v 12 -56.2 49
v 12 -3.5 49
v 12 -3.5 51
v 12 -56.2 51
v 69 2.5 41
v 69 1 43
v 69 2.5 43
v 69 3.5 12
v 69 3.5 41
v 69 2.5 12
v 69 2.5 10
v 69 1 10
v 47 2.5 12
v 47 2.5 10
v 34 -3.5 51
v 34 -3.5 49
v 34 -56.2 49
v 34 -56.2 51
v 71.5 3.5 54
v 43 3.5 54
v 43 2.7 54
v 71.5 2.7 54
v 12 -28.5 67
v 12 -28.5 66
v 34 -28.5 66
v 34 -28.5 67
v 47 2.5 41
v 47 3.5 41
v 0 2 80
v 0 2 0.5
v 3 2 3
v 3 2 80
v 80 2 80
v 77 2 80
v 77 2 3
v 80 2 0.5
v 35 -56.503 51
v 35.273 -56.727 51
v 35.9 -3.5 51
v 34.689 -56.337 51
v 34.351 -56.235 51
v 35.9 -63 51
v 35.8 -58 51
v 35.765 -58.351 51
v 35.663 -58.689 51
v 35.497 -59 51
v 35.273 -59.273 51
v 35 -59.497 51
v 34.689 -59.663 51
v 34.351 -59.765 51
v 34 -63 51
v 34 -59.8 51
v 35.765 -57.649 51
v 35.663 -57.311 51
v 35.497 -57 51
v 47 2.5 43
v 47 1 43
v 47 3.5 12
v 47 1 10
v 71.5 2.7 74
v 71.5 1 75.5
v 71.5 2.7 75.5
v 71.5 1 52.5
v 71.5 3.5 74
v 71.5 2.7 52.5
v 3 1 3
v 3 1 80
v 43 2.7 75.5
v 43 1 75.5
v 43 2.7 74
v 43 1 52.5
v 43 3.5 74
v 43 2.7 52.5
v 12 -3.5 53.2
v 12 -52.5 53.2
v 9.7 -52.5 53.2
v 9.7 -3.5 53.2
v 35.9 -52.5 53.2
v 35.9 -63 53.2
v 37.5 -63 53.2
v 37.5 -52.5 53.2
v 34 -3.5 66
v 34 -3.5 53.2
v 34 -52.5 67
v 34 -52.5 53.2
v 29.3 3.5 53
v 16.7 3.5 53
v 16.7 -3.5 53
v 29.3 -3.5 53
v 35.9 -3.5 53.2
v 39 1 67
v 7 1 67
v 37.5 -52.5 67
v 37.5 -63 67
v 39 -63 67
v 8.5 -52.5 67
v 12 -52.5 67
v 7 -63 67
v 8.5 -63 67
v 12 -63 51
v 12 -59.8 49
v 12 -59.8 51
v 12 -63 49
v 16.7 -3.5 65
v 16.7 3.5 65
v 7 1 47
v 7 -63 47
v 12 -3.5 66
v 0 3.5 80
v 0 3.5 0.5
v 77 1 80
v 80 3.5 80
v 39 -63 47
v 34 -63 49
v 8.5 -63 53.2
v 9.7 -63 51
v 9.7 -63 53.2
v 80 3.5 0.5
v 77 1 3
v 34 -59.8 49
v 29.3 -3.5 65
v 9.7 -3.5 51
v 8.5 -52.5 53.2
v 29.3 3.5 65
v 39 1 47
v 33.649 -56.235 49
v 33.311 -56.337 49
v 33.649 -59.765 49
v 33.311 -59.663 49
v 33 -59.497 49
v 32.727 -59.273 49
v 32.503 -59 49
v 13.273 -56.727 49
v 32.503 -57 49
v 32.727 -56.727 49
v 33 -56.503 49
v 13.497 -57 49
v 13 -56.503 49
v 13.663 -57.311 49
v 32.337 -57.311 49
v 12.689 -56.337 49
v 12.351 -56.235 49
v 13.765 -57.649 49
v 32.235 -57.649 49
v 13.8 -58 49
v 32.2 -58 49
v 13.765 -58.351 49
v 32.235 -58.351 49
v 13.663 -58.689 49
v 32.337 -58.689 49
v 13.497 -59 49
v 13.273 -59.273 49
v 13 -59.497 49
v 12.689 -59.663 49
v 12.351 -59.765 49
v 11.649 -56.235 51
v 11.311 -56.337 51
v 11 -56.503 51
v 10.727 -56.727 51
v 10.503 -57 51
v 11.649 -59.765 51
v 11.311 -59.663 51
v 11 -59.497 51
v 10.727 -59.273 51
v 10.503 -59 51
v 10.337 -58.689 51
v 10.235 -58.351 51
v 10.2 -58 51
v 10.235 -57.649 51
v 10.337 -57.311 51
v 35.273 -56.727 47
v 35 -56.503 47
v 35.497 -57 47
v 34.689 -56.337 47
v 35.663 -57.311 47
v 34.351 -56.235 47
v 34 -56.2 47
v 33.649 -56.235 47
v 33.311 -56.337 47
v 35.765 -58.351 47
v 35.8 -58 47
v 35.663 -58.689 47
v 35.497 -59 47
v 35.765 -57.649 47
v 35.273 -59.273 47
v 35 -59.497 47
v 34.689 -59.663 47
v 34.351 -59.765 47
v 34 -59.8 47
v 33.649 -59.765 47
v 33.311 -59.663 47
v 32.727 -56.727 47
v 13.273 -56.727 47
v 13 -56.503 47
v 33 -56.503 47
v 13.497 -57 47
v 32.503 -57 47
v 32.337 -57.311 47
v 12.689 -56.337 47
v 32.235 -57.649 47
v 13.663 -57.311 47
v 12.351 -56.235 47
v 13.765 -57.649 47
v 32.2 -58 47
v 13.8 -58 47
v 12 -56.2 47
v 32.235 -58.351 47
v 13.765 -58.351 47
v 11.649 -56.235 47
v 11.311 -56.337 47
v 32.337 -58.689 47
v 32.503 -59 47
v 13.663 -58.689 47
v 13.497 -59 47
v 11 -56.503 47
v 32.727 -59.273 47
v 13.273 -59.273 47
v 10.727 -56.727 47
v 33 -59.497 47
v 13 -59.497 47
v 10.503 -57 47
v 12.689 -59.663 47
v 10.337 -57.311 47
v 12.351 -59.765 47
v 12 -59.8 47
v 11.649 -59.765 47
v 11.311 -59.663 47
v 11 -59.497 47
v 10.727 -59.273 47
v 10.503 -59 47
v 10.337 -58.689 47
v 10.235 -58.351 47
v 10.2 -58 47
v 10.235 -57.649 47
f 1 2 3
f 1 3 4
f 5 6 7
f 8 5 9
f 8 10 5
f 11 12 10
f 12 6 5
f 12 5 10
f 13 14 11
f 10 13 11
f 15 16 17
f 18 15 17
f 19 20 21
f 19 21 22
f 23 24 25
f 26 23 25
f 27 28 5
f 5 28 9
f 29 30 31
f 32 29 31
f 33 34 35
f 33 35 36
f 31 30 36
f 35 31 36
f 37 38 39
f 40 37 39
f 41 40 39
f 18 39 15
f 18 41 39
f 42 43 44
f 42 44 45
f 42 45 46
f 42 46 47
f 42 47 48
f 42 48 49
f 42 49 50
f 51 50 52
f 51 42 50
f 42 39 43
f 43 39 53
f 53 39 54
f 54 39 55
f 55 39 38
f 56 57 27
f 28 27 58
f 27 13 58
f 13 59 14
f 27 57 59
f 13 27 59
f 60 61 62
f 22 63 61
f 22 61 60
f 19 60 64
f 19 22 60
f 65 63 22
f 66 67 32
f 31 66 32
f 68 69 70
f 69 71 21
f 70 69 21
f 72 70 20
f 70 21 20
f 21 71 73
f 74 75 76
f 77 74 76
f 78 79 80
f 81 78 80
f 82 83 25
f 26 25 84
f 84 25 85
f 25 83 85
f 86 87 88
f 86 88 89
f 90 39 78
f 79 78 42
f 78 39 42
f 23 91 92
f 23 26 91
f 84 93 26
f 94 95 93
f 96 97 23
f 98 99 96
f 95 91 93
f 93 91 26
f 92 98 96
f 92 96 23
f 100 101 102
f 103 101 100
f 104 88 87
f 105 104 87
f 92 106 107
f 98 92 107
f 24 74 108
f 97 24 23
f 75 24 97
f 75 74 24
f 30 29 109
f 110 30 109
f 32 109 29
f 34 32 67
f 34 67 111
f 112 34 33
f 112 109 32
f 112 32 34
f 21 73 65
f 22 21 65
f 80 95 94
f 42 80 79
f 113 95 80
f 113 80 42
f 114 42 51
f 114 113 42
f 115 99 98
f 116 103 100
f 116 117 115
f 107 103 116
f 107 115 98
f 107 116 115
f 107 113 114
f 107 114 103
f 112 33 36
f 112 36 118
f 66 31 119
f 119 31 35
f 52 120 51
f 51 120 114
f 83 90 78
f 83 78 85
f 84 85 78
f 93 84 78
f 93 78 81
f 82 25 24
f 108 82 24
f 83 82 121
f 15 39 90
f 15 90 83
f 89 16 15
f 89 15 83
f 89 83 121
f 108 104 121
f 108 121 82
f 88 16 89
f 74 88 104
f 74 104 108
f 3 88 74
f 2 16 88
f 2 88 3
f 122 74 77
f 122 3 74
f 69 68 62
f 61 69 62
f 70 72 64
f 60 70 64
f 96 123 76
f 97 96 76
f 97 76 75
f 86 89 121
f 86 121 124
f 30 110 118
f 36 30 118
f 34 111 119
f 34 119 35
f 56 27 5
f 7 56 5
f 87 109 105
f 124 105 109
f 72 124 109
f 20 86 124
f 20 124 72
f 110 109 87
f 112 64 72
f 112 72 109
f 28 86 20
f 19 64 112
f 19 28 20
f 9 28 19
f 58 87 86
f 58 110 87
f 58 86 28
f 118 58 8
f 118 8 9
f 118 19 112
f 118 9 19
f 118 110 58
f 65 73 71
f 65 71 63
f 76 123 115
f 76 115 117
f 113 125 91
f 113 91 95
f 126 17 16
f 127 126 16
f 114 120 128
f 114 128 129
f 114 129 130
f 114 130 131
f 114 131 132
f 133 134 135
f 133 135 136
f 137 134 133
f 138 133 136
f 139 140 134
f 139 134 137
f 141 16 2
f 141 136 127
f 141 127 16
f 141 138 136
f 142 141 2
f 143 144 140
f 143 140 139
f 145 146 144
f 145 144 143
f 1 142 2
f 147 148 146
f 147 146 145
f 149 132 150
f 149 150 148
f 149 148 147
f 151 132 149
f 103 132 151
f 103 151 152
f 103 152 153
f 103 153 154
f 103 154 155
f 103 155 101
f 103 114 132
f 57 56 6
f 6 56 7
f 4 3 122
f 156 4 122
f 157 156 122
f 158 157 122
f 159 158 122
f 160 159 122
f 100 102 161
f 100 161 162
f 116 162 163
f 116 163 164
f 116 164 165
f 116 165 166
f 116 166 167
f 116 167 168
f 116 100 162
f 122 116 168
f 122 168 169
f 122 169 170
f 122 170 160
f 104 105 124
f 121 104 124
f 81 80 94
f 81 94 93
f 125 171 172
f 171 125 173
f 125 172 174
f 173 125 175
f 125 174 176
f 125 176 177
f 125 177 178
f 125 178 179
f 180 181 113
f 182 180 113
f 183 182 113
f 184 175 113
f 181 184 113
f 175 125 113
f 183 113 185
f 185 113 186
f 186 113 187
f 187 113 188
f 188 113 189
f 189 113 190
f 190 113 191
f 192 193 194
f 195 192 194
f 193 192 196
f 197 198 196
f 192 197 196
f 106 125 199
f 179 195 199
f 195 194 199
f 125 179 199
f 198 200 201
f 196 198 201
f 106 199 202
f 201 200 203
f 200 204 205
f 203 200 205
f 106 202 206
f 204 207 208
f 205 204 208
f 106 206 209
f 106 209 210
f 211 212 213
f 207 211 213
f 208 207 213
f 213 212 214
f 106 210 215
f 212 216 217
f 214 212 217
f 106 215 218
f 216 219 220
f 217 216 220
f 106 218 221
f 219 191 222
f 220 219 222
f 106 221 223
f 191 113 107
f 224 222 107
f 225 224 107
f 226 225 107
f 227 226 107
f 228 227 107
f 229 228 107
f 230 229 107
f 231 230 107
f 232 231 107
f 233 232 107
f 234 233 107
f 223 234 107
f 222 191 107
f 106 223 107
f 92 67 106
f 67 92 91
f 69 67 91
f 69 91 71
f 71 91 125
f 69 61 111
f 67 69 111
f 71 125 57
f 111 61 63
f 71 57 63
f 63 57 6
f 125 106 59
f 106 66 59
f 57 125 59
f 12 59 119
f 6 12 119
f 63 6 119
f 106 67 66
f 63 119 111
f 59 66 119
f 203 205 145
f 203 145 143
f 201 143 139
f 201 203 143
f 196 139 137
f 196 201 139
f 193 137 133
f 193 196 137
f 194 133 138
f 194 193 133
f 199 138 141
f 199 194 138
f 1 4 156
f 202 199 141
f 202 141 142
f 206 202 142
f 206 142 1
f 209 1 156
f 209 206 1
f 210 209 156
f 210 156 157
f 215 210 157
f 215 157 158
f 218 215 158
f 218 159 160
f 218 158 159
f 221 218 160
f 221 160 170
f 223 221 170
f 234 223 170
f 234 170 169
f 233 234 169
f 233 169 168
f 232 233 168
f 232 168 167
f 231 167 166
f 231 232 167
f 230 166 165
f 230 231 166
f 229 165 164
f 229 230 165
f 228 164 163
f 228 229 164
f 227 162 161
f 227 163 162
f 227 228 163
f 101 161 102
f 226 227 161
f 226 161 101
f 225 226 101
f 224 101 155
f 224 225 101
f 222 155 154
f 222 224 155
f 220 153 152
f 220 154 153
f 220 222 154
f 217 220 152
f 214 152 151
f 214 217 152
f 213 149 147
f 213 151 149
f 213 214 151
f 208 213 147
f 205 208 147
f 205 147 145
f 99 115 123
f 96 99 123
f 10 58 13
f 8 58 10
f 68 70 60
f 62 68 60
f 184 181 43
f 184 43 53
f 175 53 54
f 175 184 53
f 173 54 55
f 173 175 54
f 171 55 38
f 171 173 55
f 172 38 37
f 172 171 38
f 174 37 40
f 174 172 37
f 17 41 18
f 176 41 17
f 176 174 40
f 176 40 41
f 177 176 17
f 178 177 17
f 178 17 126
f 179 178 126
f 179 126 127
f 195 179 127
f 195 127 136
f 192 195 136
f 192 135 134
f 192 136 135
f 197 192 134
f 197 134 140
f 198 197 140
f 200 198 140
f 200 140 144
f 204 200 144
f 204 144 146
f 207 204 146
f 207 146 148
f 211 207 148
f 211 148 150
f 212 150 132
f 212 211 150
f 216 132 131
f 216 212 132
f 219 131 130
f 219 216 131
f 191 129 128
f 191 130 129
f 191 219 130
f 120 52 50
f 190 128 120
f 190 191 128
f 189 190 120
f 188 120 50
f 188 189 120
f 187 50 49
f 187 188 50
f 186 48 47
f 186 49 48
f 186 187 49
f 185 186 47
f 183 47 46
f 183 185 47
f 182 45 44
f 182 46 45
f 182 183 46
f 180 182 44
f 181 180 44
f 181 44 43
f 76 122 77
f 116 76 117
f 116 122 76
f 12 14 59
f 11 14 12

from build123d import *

# Parameters (mm, degrees)
BOX019_W          = 28.5
BOX019_H          = 10
BOX019_DEPTH      = 20
BOX020_W          = 22
BOX020_H          = 10
BOX020_DEPTH      = 33
BOX021_W          = 28.5
BOX021_H          = 10
BOX021_DEPTH      = 23
BOX024_W          = 26.2
BOX024_H          = 60
BOX024_DEPTH      = 2.2
BOX025_W          = 22
BOX025_H          = 60
BOX025_DEPTH      = 17
CYLINDER008_R     = 1.8
CYLINDER008_DEPTH = 30
CYLINDER009_R     = 1.8
CYLINDER009_DEPTH = 30
BOX026_W          = 29
BOX026_H          = 13
BOX026_DEPTH      = 15
BOX027_W          = 22
BOX027_H          = 25
BOX027_DEPTH      = 15
BOX022_W          = 12.6
BOX022_H          = 20
BOX022_DEPTH      = 12
BOX018_W          = 22
BOX018_H          = 10
BOX018_DEPTH      = 29
BOX014_W          = 80
BOX014_H          = 1.5
BOX014_DEPTH      = 79.5
BOX023_W          = 32
BOX023_H          = 64
BOX023_DEPTH      = 20
BOX015_W          = 74
BOX015_H          = 2
BOX015_DEPTH      = 77


with BuildPart() as pc:
    # Box019 → Box019 (new body)
    with BuildSketch(Plane(origin=(43, 0, 54), x_dir=(1, 0, 0), z_dir=(0, 0, 1))):
        with Locations((14.25, 5)):
            Rectangle(BOX019_W, BOX019_H)
    extrude(amount=BOX019_DEPTH)


with BuildPart() as vypinac001:
    # Box020 → Box020 (new body)
    with BuildSketch(Plane(origin=(47, -7.5, 10), x_dir=(1, 0, 0), z_dir=(0, 0, 1))):
        with Locations((11, 5)):
            Rectangle(BOX020_W, BOX020_H)
    extrude(amount=BOX020_DEPTH)


with BuildPart() as pc001:
    # Box021 → Box021 (new body)
    with BuildSketch(Plane(origin=(43, -7.3, 52.5), x_dir=(1, 0, 0), z_dir=(0, 0, 1))):
        with Locations((14.25, 5)):
            Rectangle(BOX021_W, BOX021_H)
    extrude(amount=BOX021_DEPTH)


with BuildPart() as cube018_doska:
    # Box024 → Box024 (new body)
    with BuildSketch(Plane(origin=(35.9, -3.5, 51), x_dir=(-1, 0, 0), z_dir=(0, 0, 1))):
        with Locations((13.1, 30)):
            Rectangle(BOX024_W, BOX024_H)
    extrude(amount=BOX024_DEPTH)


with BuildPart() as cube019_okolo_doskjy:
    # Box025 → Box025 (new body)
    with BuildSketch(Plane(origin=(34, -3.5, 49), x_dir=(-1, 0, 0), z_dir=(0, 0, 1))):
        with Locations((11, 30)):
            Rectangle(BOX025_W, BOX025_H)
    extrude(amount=BOX025_DEPTH)


with BuildPart() as cylinder008:
    # Cylinder008 → Cylinder008 (new body)
    with BuildSketch(Plane(origin=(34, -58, 38), x_dir=(1, 0, 0), z_dir=(0, 0, 1))):
        Circle(CYLINDER008_R)
    extrude(amount=CYLINDER008_DEPTH)


with BuildPart() as cylinder009:
    # Cylinder009 → Cylinder009 (new body)
    with BuildSketch(Plane(origin=(12, -58, 38), x_dir=(1, 0, 0), z_dir=(0, 0, 1))):
        Circle(CYLINDER009_R)
    extrude(amount=CYLINDER009_DEPTH)


with BuildPart() as cube016_pre_sroby:
    # Box026 → Box026 (new body)
    with BuildSketch(Plane(origin=(8.5, -65.5, 53.2), x_dir=(1, 0, 0), z_dir=(0, 0, 1))):
        with Locations((14.5, 6.5)):
            Rectangle(BOX026_W, BOX026_H)
    extrude(amount=BOX026_DEPTH)


with BuildPart() as cube016_pre_rele:
    # Box027 → Box027 (new body)
    with BuildSketch(Plane(origin=(12, -53.5, 65.2), x_dir=(1, 0, 0), z_dir=(0, 0, 1))):
        with Locations((11, 12.5)):
            Rectangle(BOX027_W, BOX027_H)
    extrude(amount=BOX027_DEPTH)


with BuildPart() as fusion006_usbrele:
    # Box022 → Box022 (new body)
    with BuildSketch(Plane(origin=(16.7, -9, 53), x_dir=(1, 0, 0), z_dir=(0, 0, 1))):
        with Locations((6.3, 10)):
            Rectangle(BOX022_W, BOX022_H)
    extrude(amount=BOX022_DEPTH)

    # Fusion006: union Cube018_doska, Cube019_okolo_doskjy, Cylinder008, Cylinder009, Cube016_pre_sroby, Cube016_pre_rele
    add(cube018_doska.part)
    add(cube019_okolo_doskjy.part)
    add(cylinder008.part)
    add(cylinder009.part)
    add(cube016_pre_sroby.part)
    add(cube016_pre_rele.part)


with BuildPart() as fusion004:
    # Box018 → Box018 (new body)
    with BuildSketch(Plane(origin=(47, -6.5, 12), x_dir=(1, 0, 0), z_dir=(0, 0, 1))):
        with Locations((11, 5)):
            Rectangle(BOX018_W, BOX018_H)
    extrude(amount=BOX018_DEPTH)

    # Fusion004: union PC, Vypinac001, PC001, Fusion006_usbrele
    add(pc.part)
    add(vypinac001.part)
    add(pc001.part)
    add(fusion006_usbrele.part)


with BuildPart() as cube014:
    # Box014 → Box014 (new body)
    with BuildSketch(Plane(origin=(0, 2, 0.5), x_dir=(1, 0, 0), z_dir=(0, 0, 1))):
        with Locations((40, 0.75)):
            Rectangle(BOX014_W, BOX014_H)
    extrude(amount=BOX014_DEPTH)


with BuildPart() as cube017_rele:
    # Box023 → Box023 (new body)
    with BuildSketch(Plane(origin=(39, 1, 47), x_dir=(-1, 0, 0), z_dir=(0, 0, 1))):
        with Locations((16, 32)):
            Rectangle(BOX023_W, BOX023_H)
    extrude(amount=BOX023_DEPTH)


with BuildPart() as cut_zadok_usb:
    # Box015 → Box015 (new body)
    with BuildSketch(Plane(origin=(3, 1, 3), x_dir=(1, 0, 0), z_dir=(0, 0, 1))):
        with Locations((37, 1)):
            Rectangle(BOX015_W, BOX015_H)
    extrude(amount=BOX015_DEPTH)

    # Fusion005: union Cube014, Cube017_rele
    add(cube014.part)
    add(cube017_rele.part)

    # Cut002: cut Fusion004
    add(fusion004.part, mode=Mode.SUBTRACT)


solid = cut_zadok_usb.part
